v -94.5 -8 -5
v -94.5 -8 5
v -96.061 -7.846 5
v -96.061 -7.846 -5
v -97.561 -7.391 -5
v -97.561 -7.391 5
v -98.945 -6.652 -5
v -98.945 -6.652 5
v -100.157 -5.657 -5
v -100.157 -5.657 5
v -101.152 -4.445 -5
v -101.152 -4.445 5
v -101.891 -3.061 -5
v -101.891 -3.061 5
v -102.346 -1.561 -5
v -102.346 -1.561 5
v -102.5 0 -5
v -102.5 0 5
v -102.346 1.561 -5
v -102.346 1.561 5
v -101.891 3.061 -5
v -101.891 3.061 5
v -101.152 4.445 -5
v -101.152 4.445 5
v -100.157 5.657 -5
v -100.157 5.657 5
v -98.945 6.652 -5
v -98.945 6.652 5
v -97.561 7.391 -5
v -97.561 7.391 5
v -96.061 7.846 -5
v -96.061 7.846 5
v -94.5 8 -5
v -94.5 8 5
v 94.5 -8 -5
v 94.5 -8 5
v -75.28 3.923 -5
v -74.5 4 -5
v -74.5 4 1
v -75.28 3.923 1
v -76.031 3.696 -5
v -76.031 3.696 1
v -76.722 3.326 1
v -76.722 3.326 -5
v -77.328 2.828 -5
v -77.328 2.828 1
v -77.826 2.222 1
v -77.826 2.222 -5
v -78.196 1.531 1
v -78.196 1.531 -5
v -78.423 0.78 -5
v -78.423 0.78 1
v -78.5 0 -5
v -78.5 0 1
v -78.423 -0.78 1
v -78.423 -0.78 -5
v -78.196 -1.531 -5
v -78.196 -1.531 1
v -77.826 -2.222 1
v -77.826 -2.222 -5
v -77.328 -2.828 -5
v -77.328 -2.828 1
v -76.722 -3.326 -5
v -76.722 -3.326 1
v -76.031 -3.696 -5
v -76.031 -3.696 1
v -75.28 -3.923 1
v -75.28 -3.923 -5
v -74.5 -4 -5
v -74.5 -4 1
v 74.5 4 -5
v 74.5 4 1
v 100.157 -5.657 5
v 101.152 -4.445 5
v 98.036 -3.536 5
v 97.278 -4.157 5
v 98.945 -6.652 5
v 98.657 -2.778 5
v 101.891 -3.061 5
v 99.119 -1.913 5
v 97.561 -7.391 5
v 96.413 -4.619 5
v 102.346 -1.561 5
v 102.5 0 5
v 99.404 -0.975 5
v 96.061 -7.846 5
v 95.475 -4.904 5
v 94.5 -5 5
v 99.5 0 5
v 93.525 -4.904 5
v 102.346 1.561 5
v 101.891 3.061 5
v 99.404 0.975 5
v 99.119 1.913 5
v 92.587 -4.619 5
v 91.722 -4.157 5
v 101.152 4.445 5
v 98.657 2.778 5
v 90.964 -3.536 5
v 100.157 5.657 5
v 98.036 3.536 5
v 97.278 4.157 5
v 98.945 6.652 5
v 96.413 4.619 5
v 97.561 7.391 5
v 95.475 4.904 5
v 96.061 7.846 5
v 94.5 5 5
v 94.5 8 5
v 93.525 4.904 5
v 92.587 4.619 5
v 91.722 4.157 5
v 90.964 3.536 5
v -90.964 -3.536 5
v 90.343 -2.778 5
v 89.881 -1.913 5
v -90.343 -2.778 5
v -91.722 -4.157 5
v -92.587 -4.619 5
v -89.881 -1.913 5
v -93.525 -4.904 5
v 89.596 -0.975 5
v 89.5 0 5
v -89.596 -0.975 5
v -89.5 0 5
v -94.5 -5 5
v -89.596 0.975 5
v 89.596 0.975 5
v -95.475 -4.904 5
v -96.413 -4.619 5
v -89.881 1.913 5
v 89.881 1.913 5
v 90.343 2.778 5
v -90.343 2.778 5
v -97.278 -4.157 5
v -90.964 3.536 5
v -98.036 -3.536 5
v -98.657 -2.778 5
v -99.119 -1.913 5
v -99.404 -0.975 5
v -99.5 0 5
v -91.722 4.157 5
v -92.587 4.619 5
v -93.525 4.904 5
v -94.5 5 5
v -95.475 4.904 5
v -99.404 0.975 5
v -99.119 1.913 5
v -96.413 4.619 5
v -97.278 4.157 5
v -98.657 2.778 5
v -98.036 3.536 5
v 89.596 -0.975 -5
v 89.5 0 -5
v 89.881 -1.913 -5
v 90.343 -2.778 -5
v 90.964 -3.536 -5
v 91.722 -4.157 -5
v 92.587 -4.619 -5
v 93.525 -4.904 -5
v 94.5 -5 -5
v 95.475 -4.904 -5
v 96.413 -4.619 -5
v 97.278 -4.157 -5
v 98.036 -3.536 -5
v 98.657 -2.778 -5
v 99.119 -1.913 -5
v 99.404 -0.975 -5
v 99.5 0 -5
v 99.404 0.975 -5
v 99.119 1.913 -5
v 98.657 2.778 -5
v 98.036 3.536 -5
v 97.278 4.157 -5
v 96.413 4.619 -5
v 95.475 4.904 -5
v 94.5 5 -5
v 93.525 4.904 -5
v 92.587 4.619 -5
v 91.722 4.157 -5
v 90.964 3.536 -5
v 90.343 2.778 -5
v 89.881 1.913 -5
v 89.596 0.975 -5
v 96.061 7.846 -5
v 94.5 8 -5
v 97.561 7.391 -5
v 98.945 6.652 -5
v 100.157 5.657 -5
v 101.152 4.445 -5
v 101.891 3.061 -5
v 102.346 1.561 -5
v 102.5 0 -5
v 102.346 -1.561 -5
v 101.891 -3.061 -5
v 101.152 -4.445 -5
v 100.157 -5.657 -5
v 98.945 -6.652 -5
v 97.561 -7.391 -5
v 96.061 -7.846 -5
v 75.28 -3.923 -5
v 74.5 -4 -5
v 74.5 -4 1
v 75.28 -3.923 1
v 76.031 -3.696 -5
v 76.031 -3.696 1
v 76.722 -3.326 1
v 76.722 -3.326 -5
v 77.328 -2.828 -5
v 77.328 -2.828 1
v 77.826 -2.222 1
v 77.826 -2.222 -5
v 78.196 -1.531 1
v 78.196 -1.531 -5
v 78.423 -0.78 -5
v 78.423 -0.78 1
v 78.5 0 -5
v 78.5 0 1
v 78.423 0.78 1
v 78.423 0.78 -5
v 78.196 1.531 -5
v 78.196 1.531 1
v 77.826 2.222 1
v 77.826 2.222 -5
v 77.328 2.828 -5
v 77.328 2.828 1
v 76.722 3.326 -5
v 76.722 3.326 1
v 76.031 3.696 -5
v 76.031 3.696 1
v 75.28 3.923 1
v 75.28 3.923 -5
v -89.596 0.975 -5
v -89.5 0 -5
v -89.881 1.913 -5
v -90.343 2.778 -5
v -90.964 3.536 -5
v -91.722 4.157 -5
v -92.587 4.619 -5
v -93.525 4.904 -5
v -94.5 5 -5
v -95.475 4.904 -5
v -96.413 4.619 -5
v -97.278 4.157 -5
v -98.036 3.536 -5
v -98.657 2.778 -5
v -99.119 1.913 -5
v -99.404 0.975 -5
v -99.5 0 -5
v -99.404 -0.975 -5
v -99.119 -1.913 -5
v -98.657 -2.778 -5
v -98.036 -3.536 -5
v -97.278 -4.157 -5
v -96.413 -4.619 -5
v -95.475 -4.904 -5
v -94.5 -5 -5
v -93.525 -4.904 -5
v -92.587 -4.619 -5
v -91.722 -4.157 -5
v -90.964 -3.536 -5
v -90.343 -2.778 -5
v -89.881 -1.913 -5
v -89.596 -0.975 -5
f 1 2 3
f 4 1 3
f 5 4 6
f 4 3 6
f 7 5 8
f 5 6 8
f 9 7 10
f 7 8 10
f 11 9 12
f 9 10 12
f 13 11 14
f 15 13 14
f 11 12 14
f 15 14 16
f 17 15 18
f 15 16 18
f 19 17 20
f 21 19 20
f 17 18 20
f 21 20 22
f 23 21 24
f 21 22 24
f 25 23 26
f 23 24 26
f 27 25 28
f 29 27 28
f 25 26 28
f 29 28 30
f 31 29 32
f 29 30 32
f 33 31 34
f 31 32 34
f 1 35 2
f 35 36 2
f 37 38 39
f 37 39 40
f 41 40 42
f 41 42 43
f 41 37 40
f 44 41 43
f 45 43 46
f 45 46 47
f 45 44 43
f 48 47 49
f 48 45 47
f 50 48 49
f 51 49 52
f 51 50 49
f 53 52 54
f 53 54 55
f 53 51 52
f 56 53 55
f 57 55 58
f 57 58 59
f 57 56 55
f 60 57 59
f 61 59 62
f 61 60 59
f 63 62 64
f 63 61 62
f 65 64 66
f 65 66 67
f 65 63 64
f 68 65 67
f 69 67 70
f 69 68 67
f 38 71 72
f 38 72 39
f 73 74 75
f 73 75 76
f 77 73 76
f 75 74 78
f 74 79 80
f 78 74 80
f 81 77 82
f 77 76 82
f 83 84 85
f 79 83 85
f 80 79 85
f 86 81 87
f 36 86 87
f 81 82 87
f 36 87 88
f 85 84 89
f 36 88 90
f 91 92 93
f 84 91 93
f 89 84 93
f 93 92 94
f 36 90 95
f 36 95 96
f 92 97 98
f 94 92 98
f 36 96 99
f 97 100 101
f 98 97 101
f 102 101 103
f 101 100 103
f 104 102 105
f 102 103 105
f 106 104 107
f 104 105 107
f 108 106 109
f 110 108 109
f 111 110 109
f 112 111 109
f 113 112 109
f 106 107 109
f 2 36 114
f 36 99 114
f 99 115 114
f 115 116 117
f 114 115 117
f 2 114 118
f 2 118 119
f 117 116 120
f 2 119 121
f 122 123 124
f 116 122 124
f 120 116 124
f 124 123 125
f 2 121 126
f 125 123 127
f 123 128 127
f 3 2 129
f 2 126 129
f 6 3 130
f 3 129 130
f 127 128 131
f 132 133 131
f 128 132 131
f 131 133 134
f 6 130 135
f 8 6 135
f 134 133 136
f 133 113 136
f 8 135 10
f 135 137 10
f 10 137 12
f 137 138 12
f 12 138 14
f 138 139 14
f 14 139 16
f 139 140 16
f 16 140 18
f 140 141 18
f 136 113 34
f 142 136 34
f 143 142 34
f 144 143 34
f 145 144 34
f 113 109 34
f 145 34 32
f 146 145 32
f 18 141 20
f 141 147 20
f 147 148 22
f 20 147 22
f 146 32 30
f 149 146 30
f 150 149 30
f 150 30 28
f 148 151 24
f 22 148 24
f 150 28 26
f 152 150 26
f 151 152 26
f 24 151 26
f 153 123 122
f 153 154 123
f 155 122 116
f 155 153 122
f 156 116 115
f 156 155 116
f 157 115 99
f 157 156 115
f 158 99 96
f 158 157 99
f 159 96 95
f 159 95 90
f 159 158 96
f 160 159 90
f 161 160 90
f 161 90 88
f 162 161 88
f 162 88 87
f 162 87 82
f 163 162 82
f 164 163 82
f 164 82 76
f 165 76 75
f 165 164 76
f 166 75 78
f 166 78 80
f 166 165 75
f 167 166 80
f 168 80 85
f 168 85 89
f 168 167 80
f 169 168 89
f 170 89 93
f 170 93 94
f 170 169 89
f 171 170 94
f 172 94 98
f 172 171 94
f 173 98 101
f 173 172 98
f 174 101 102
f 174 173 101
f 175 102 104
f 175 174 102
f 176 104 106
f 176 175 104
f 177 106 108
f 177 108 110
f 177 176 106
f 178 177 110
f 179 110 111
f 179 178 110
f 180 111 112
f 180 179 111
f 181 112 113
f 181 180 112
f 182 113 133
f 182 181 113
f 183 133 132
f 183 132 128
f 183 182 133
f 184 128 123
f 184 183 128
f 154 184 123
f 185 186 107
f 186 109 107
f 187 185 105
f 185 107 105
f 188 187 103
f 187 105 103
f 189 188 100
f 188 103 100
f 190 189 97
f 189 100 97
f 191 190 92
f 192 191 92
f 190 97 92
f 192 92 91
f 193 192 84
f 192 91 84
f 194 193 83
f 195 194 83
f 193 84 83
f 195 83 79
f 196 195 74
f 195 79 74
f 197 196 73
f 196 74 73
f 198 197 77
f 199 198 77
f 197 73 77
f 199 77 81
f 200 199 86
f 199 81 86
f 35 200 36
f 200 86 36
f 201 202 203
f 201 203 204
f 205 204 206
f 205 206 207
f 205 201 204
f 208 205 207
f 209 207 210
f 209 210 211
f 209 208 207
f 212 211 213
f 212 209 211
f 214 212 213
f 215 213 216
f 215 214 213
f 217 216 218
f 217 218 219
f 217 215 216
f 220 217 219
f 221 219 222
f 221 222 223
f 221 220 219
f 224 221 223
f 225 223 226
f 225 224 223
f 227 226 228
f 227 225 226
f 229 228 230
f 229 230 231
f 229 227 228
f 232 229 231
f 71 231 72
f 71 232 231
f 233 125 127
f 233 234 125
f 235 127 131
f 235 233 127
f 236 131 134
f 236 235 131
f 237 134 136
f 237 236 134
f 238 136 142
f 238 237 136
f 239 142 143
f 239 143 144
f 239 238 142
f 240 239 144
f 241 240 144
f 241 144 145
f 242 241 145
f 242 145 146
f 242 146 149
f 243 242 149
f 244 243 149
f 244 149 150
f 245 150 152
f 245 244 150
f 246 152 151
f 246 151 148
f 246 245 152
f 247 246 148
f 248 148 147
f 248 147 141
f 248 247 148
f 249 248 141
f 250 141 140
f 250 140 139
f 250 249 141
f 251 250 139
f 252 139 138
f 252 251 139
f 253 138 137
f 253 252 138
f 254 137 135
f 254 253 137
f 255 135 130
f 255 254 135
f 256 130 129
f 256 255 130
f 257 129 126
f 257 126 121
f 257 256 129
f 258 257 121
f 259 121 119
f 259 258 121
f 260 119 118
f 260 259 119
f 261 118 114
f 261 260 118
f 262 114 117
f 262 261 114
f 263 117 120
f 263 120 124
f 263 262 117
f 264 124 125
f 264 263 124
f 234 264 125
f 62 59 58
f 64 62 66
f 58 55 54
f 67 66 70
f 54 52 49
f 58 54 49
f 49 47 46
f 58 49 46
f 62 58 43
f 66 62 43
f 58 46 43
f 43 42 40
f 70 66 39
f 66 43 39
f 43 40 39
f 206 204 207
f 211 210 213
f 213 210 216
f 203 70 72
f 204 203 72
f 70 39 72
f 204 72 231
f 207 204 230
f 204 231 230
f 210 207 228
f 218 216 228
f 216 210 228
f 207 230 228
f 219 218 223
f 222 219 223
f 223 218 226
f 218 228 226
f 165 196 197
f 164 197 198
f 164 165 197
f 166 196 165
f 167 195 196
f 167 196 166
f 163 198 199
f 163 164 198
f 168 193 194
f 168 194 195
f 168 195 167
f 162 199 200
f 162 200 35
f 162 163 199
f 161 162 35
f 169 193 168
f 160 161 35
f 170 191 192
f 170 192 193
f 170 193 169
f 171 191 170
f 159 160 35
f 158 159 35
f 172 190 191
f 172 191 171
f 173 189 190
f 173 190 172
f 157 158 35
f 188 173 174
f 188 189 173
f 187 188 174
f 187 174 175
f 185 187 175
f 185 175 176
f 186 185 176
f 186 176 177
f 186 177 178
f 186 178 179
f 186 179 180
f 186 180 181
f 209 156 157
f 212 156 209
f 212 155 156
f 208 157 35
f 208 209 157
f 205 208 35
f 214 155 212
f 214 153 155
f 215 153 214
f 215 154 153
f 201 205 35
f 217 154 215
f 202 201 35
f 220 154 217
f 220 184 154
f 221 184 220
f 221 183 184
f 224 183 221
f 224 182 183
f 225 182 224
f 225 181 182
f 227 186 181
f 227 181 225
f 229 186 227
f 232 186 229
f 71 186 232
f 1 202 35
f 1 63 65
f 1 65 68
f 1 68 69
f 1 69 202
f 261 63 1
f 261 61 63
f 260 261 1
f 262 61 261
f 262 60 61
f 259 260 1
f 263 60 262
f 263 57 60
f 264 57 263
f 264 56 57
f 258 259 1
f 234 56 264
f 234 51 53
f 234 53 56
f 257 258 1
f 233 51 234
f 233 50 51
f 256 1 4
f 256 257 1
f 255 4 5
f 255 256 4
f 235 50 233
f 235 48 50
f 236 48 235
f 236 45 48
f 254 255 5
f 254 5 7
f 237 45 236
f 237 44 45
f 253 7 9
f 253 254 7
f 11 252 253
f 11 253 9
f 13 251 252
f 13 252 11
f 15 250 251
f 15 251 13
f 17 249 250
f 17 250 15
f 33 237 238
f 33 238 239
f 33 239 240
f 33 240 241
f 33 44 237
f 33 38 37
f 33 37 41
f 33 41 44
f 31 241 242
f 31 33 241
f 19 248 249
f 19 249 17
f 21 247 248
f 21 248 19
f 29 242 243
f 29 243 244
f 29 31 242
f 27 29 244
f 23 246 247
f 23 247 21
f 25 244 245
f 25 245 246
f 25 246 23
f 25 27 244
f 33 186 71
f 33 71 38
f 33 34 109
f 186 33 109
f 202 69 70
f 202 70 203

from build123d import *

# Parameters (mm, degrees)
SKETCH1_R           = 5
BOSS_EXTRUDE1_DEPTH = 5
CUT_EXTRUDE1_DEPTH  = 6


with BuildPart() as part:
    # Sketch1 → Boss-Extrude1 (new, symmetric)
    with BuildSketch(Plane.XY):
        with BuildLine():
            Line((-94.5, 8), (94.5, 8))
            ThreePointArc((94.5, 8), (102.5, 0), (94.5, -8))
            Line((94.5, -8), (-94.5, -8))
            ThreePointArc((-94.5, -8), (-102.5, 0), (-94.5, 8))
        make_face()
        with Locations((-94.5, 0)):
            Circle(SKETCH1_R, mode=Mode.SUBTRACT)
        with Locations(Location((94.5, 0, 0), (0, 0, 180))):
            Circle(SKETCH1_R, mode=Mode.SUBTRACT)
    extrude(amount=BOSS_EXTRUDE1_DEPTH, both=True)

    # Sketch2 → Cut-Extrude1 (cut)
    with BuildSketch(Plane(origin=(0, 0, -5), x_dir=(-1, 0, 0), z_dir=(0, 0, -1))):
        with BuildLine():
            Line((-74.5, 4), (74.5, 4))
            ThreePointArc((74.5, 4), (78.5, 0), (74.5, -4))
            Line((74.5, -4), (-74.5, -4))
            ThreePointArc((-74.5, -4), (-78.5, 0), (-74.5, 4))
        make_face()
    extrude(amount=-CUT_EXTRUDE1_DEPTH, mode=Mode.SUBTRACT)


solid = part.part
